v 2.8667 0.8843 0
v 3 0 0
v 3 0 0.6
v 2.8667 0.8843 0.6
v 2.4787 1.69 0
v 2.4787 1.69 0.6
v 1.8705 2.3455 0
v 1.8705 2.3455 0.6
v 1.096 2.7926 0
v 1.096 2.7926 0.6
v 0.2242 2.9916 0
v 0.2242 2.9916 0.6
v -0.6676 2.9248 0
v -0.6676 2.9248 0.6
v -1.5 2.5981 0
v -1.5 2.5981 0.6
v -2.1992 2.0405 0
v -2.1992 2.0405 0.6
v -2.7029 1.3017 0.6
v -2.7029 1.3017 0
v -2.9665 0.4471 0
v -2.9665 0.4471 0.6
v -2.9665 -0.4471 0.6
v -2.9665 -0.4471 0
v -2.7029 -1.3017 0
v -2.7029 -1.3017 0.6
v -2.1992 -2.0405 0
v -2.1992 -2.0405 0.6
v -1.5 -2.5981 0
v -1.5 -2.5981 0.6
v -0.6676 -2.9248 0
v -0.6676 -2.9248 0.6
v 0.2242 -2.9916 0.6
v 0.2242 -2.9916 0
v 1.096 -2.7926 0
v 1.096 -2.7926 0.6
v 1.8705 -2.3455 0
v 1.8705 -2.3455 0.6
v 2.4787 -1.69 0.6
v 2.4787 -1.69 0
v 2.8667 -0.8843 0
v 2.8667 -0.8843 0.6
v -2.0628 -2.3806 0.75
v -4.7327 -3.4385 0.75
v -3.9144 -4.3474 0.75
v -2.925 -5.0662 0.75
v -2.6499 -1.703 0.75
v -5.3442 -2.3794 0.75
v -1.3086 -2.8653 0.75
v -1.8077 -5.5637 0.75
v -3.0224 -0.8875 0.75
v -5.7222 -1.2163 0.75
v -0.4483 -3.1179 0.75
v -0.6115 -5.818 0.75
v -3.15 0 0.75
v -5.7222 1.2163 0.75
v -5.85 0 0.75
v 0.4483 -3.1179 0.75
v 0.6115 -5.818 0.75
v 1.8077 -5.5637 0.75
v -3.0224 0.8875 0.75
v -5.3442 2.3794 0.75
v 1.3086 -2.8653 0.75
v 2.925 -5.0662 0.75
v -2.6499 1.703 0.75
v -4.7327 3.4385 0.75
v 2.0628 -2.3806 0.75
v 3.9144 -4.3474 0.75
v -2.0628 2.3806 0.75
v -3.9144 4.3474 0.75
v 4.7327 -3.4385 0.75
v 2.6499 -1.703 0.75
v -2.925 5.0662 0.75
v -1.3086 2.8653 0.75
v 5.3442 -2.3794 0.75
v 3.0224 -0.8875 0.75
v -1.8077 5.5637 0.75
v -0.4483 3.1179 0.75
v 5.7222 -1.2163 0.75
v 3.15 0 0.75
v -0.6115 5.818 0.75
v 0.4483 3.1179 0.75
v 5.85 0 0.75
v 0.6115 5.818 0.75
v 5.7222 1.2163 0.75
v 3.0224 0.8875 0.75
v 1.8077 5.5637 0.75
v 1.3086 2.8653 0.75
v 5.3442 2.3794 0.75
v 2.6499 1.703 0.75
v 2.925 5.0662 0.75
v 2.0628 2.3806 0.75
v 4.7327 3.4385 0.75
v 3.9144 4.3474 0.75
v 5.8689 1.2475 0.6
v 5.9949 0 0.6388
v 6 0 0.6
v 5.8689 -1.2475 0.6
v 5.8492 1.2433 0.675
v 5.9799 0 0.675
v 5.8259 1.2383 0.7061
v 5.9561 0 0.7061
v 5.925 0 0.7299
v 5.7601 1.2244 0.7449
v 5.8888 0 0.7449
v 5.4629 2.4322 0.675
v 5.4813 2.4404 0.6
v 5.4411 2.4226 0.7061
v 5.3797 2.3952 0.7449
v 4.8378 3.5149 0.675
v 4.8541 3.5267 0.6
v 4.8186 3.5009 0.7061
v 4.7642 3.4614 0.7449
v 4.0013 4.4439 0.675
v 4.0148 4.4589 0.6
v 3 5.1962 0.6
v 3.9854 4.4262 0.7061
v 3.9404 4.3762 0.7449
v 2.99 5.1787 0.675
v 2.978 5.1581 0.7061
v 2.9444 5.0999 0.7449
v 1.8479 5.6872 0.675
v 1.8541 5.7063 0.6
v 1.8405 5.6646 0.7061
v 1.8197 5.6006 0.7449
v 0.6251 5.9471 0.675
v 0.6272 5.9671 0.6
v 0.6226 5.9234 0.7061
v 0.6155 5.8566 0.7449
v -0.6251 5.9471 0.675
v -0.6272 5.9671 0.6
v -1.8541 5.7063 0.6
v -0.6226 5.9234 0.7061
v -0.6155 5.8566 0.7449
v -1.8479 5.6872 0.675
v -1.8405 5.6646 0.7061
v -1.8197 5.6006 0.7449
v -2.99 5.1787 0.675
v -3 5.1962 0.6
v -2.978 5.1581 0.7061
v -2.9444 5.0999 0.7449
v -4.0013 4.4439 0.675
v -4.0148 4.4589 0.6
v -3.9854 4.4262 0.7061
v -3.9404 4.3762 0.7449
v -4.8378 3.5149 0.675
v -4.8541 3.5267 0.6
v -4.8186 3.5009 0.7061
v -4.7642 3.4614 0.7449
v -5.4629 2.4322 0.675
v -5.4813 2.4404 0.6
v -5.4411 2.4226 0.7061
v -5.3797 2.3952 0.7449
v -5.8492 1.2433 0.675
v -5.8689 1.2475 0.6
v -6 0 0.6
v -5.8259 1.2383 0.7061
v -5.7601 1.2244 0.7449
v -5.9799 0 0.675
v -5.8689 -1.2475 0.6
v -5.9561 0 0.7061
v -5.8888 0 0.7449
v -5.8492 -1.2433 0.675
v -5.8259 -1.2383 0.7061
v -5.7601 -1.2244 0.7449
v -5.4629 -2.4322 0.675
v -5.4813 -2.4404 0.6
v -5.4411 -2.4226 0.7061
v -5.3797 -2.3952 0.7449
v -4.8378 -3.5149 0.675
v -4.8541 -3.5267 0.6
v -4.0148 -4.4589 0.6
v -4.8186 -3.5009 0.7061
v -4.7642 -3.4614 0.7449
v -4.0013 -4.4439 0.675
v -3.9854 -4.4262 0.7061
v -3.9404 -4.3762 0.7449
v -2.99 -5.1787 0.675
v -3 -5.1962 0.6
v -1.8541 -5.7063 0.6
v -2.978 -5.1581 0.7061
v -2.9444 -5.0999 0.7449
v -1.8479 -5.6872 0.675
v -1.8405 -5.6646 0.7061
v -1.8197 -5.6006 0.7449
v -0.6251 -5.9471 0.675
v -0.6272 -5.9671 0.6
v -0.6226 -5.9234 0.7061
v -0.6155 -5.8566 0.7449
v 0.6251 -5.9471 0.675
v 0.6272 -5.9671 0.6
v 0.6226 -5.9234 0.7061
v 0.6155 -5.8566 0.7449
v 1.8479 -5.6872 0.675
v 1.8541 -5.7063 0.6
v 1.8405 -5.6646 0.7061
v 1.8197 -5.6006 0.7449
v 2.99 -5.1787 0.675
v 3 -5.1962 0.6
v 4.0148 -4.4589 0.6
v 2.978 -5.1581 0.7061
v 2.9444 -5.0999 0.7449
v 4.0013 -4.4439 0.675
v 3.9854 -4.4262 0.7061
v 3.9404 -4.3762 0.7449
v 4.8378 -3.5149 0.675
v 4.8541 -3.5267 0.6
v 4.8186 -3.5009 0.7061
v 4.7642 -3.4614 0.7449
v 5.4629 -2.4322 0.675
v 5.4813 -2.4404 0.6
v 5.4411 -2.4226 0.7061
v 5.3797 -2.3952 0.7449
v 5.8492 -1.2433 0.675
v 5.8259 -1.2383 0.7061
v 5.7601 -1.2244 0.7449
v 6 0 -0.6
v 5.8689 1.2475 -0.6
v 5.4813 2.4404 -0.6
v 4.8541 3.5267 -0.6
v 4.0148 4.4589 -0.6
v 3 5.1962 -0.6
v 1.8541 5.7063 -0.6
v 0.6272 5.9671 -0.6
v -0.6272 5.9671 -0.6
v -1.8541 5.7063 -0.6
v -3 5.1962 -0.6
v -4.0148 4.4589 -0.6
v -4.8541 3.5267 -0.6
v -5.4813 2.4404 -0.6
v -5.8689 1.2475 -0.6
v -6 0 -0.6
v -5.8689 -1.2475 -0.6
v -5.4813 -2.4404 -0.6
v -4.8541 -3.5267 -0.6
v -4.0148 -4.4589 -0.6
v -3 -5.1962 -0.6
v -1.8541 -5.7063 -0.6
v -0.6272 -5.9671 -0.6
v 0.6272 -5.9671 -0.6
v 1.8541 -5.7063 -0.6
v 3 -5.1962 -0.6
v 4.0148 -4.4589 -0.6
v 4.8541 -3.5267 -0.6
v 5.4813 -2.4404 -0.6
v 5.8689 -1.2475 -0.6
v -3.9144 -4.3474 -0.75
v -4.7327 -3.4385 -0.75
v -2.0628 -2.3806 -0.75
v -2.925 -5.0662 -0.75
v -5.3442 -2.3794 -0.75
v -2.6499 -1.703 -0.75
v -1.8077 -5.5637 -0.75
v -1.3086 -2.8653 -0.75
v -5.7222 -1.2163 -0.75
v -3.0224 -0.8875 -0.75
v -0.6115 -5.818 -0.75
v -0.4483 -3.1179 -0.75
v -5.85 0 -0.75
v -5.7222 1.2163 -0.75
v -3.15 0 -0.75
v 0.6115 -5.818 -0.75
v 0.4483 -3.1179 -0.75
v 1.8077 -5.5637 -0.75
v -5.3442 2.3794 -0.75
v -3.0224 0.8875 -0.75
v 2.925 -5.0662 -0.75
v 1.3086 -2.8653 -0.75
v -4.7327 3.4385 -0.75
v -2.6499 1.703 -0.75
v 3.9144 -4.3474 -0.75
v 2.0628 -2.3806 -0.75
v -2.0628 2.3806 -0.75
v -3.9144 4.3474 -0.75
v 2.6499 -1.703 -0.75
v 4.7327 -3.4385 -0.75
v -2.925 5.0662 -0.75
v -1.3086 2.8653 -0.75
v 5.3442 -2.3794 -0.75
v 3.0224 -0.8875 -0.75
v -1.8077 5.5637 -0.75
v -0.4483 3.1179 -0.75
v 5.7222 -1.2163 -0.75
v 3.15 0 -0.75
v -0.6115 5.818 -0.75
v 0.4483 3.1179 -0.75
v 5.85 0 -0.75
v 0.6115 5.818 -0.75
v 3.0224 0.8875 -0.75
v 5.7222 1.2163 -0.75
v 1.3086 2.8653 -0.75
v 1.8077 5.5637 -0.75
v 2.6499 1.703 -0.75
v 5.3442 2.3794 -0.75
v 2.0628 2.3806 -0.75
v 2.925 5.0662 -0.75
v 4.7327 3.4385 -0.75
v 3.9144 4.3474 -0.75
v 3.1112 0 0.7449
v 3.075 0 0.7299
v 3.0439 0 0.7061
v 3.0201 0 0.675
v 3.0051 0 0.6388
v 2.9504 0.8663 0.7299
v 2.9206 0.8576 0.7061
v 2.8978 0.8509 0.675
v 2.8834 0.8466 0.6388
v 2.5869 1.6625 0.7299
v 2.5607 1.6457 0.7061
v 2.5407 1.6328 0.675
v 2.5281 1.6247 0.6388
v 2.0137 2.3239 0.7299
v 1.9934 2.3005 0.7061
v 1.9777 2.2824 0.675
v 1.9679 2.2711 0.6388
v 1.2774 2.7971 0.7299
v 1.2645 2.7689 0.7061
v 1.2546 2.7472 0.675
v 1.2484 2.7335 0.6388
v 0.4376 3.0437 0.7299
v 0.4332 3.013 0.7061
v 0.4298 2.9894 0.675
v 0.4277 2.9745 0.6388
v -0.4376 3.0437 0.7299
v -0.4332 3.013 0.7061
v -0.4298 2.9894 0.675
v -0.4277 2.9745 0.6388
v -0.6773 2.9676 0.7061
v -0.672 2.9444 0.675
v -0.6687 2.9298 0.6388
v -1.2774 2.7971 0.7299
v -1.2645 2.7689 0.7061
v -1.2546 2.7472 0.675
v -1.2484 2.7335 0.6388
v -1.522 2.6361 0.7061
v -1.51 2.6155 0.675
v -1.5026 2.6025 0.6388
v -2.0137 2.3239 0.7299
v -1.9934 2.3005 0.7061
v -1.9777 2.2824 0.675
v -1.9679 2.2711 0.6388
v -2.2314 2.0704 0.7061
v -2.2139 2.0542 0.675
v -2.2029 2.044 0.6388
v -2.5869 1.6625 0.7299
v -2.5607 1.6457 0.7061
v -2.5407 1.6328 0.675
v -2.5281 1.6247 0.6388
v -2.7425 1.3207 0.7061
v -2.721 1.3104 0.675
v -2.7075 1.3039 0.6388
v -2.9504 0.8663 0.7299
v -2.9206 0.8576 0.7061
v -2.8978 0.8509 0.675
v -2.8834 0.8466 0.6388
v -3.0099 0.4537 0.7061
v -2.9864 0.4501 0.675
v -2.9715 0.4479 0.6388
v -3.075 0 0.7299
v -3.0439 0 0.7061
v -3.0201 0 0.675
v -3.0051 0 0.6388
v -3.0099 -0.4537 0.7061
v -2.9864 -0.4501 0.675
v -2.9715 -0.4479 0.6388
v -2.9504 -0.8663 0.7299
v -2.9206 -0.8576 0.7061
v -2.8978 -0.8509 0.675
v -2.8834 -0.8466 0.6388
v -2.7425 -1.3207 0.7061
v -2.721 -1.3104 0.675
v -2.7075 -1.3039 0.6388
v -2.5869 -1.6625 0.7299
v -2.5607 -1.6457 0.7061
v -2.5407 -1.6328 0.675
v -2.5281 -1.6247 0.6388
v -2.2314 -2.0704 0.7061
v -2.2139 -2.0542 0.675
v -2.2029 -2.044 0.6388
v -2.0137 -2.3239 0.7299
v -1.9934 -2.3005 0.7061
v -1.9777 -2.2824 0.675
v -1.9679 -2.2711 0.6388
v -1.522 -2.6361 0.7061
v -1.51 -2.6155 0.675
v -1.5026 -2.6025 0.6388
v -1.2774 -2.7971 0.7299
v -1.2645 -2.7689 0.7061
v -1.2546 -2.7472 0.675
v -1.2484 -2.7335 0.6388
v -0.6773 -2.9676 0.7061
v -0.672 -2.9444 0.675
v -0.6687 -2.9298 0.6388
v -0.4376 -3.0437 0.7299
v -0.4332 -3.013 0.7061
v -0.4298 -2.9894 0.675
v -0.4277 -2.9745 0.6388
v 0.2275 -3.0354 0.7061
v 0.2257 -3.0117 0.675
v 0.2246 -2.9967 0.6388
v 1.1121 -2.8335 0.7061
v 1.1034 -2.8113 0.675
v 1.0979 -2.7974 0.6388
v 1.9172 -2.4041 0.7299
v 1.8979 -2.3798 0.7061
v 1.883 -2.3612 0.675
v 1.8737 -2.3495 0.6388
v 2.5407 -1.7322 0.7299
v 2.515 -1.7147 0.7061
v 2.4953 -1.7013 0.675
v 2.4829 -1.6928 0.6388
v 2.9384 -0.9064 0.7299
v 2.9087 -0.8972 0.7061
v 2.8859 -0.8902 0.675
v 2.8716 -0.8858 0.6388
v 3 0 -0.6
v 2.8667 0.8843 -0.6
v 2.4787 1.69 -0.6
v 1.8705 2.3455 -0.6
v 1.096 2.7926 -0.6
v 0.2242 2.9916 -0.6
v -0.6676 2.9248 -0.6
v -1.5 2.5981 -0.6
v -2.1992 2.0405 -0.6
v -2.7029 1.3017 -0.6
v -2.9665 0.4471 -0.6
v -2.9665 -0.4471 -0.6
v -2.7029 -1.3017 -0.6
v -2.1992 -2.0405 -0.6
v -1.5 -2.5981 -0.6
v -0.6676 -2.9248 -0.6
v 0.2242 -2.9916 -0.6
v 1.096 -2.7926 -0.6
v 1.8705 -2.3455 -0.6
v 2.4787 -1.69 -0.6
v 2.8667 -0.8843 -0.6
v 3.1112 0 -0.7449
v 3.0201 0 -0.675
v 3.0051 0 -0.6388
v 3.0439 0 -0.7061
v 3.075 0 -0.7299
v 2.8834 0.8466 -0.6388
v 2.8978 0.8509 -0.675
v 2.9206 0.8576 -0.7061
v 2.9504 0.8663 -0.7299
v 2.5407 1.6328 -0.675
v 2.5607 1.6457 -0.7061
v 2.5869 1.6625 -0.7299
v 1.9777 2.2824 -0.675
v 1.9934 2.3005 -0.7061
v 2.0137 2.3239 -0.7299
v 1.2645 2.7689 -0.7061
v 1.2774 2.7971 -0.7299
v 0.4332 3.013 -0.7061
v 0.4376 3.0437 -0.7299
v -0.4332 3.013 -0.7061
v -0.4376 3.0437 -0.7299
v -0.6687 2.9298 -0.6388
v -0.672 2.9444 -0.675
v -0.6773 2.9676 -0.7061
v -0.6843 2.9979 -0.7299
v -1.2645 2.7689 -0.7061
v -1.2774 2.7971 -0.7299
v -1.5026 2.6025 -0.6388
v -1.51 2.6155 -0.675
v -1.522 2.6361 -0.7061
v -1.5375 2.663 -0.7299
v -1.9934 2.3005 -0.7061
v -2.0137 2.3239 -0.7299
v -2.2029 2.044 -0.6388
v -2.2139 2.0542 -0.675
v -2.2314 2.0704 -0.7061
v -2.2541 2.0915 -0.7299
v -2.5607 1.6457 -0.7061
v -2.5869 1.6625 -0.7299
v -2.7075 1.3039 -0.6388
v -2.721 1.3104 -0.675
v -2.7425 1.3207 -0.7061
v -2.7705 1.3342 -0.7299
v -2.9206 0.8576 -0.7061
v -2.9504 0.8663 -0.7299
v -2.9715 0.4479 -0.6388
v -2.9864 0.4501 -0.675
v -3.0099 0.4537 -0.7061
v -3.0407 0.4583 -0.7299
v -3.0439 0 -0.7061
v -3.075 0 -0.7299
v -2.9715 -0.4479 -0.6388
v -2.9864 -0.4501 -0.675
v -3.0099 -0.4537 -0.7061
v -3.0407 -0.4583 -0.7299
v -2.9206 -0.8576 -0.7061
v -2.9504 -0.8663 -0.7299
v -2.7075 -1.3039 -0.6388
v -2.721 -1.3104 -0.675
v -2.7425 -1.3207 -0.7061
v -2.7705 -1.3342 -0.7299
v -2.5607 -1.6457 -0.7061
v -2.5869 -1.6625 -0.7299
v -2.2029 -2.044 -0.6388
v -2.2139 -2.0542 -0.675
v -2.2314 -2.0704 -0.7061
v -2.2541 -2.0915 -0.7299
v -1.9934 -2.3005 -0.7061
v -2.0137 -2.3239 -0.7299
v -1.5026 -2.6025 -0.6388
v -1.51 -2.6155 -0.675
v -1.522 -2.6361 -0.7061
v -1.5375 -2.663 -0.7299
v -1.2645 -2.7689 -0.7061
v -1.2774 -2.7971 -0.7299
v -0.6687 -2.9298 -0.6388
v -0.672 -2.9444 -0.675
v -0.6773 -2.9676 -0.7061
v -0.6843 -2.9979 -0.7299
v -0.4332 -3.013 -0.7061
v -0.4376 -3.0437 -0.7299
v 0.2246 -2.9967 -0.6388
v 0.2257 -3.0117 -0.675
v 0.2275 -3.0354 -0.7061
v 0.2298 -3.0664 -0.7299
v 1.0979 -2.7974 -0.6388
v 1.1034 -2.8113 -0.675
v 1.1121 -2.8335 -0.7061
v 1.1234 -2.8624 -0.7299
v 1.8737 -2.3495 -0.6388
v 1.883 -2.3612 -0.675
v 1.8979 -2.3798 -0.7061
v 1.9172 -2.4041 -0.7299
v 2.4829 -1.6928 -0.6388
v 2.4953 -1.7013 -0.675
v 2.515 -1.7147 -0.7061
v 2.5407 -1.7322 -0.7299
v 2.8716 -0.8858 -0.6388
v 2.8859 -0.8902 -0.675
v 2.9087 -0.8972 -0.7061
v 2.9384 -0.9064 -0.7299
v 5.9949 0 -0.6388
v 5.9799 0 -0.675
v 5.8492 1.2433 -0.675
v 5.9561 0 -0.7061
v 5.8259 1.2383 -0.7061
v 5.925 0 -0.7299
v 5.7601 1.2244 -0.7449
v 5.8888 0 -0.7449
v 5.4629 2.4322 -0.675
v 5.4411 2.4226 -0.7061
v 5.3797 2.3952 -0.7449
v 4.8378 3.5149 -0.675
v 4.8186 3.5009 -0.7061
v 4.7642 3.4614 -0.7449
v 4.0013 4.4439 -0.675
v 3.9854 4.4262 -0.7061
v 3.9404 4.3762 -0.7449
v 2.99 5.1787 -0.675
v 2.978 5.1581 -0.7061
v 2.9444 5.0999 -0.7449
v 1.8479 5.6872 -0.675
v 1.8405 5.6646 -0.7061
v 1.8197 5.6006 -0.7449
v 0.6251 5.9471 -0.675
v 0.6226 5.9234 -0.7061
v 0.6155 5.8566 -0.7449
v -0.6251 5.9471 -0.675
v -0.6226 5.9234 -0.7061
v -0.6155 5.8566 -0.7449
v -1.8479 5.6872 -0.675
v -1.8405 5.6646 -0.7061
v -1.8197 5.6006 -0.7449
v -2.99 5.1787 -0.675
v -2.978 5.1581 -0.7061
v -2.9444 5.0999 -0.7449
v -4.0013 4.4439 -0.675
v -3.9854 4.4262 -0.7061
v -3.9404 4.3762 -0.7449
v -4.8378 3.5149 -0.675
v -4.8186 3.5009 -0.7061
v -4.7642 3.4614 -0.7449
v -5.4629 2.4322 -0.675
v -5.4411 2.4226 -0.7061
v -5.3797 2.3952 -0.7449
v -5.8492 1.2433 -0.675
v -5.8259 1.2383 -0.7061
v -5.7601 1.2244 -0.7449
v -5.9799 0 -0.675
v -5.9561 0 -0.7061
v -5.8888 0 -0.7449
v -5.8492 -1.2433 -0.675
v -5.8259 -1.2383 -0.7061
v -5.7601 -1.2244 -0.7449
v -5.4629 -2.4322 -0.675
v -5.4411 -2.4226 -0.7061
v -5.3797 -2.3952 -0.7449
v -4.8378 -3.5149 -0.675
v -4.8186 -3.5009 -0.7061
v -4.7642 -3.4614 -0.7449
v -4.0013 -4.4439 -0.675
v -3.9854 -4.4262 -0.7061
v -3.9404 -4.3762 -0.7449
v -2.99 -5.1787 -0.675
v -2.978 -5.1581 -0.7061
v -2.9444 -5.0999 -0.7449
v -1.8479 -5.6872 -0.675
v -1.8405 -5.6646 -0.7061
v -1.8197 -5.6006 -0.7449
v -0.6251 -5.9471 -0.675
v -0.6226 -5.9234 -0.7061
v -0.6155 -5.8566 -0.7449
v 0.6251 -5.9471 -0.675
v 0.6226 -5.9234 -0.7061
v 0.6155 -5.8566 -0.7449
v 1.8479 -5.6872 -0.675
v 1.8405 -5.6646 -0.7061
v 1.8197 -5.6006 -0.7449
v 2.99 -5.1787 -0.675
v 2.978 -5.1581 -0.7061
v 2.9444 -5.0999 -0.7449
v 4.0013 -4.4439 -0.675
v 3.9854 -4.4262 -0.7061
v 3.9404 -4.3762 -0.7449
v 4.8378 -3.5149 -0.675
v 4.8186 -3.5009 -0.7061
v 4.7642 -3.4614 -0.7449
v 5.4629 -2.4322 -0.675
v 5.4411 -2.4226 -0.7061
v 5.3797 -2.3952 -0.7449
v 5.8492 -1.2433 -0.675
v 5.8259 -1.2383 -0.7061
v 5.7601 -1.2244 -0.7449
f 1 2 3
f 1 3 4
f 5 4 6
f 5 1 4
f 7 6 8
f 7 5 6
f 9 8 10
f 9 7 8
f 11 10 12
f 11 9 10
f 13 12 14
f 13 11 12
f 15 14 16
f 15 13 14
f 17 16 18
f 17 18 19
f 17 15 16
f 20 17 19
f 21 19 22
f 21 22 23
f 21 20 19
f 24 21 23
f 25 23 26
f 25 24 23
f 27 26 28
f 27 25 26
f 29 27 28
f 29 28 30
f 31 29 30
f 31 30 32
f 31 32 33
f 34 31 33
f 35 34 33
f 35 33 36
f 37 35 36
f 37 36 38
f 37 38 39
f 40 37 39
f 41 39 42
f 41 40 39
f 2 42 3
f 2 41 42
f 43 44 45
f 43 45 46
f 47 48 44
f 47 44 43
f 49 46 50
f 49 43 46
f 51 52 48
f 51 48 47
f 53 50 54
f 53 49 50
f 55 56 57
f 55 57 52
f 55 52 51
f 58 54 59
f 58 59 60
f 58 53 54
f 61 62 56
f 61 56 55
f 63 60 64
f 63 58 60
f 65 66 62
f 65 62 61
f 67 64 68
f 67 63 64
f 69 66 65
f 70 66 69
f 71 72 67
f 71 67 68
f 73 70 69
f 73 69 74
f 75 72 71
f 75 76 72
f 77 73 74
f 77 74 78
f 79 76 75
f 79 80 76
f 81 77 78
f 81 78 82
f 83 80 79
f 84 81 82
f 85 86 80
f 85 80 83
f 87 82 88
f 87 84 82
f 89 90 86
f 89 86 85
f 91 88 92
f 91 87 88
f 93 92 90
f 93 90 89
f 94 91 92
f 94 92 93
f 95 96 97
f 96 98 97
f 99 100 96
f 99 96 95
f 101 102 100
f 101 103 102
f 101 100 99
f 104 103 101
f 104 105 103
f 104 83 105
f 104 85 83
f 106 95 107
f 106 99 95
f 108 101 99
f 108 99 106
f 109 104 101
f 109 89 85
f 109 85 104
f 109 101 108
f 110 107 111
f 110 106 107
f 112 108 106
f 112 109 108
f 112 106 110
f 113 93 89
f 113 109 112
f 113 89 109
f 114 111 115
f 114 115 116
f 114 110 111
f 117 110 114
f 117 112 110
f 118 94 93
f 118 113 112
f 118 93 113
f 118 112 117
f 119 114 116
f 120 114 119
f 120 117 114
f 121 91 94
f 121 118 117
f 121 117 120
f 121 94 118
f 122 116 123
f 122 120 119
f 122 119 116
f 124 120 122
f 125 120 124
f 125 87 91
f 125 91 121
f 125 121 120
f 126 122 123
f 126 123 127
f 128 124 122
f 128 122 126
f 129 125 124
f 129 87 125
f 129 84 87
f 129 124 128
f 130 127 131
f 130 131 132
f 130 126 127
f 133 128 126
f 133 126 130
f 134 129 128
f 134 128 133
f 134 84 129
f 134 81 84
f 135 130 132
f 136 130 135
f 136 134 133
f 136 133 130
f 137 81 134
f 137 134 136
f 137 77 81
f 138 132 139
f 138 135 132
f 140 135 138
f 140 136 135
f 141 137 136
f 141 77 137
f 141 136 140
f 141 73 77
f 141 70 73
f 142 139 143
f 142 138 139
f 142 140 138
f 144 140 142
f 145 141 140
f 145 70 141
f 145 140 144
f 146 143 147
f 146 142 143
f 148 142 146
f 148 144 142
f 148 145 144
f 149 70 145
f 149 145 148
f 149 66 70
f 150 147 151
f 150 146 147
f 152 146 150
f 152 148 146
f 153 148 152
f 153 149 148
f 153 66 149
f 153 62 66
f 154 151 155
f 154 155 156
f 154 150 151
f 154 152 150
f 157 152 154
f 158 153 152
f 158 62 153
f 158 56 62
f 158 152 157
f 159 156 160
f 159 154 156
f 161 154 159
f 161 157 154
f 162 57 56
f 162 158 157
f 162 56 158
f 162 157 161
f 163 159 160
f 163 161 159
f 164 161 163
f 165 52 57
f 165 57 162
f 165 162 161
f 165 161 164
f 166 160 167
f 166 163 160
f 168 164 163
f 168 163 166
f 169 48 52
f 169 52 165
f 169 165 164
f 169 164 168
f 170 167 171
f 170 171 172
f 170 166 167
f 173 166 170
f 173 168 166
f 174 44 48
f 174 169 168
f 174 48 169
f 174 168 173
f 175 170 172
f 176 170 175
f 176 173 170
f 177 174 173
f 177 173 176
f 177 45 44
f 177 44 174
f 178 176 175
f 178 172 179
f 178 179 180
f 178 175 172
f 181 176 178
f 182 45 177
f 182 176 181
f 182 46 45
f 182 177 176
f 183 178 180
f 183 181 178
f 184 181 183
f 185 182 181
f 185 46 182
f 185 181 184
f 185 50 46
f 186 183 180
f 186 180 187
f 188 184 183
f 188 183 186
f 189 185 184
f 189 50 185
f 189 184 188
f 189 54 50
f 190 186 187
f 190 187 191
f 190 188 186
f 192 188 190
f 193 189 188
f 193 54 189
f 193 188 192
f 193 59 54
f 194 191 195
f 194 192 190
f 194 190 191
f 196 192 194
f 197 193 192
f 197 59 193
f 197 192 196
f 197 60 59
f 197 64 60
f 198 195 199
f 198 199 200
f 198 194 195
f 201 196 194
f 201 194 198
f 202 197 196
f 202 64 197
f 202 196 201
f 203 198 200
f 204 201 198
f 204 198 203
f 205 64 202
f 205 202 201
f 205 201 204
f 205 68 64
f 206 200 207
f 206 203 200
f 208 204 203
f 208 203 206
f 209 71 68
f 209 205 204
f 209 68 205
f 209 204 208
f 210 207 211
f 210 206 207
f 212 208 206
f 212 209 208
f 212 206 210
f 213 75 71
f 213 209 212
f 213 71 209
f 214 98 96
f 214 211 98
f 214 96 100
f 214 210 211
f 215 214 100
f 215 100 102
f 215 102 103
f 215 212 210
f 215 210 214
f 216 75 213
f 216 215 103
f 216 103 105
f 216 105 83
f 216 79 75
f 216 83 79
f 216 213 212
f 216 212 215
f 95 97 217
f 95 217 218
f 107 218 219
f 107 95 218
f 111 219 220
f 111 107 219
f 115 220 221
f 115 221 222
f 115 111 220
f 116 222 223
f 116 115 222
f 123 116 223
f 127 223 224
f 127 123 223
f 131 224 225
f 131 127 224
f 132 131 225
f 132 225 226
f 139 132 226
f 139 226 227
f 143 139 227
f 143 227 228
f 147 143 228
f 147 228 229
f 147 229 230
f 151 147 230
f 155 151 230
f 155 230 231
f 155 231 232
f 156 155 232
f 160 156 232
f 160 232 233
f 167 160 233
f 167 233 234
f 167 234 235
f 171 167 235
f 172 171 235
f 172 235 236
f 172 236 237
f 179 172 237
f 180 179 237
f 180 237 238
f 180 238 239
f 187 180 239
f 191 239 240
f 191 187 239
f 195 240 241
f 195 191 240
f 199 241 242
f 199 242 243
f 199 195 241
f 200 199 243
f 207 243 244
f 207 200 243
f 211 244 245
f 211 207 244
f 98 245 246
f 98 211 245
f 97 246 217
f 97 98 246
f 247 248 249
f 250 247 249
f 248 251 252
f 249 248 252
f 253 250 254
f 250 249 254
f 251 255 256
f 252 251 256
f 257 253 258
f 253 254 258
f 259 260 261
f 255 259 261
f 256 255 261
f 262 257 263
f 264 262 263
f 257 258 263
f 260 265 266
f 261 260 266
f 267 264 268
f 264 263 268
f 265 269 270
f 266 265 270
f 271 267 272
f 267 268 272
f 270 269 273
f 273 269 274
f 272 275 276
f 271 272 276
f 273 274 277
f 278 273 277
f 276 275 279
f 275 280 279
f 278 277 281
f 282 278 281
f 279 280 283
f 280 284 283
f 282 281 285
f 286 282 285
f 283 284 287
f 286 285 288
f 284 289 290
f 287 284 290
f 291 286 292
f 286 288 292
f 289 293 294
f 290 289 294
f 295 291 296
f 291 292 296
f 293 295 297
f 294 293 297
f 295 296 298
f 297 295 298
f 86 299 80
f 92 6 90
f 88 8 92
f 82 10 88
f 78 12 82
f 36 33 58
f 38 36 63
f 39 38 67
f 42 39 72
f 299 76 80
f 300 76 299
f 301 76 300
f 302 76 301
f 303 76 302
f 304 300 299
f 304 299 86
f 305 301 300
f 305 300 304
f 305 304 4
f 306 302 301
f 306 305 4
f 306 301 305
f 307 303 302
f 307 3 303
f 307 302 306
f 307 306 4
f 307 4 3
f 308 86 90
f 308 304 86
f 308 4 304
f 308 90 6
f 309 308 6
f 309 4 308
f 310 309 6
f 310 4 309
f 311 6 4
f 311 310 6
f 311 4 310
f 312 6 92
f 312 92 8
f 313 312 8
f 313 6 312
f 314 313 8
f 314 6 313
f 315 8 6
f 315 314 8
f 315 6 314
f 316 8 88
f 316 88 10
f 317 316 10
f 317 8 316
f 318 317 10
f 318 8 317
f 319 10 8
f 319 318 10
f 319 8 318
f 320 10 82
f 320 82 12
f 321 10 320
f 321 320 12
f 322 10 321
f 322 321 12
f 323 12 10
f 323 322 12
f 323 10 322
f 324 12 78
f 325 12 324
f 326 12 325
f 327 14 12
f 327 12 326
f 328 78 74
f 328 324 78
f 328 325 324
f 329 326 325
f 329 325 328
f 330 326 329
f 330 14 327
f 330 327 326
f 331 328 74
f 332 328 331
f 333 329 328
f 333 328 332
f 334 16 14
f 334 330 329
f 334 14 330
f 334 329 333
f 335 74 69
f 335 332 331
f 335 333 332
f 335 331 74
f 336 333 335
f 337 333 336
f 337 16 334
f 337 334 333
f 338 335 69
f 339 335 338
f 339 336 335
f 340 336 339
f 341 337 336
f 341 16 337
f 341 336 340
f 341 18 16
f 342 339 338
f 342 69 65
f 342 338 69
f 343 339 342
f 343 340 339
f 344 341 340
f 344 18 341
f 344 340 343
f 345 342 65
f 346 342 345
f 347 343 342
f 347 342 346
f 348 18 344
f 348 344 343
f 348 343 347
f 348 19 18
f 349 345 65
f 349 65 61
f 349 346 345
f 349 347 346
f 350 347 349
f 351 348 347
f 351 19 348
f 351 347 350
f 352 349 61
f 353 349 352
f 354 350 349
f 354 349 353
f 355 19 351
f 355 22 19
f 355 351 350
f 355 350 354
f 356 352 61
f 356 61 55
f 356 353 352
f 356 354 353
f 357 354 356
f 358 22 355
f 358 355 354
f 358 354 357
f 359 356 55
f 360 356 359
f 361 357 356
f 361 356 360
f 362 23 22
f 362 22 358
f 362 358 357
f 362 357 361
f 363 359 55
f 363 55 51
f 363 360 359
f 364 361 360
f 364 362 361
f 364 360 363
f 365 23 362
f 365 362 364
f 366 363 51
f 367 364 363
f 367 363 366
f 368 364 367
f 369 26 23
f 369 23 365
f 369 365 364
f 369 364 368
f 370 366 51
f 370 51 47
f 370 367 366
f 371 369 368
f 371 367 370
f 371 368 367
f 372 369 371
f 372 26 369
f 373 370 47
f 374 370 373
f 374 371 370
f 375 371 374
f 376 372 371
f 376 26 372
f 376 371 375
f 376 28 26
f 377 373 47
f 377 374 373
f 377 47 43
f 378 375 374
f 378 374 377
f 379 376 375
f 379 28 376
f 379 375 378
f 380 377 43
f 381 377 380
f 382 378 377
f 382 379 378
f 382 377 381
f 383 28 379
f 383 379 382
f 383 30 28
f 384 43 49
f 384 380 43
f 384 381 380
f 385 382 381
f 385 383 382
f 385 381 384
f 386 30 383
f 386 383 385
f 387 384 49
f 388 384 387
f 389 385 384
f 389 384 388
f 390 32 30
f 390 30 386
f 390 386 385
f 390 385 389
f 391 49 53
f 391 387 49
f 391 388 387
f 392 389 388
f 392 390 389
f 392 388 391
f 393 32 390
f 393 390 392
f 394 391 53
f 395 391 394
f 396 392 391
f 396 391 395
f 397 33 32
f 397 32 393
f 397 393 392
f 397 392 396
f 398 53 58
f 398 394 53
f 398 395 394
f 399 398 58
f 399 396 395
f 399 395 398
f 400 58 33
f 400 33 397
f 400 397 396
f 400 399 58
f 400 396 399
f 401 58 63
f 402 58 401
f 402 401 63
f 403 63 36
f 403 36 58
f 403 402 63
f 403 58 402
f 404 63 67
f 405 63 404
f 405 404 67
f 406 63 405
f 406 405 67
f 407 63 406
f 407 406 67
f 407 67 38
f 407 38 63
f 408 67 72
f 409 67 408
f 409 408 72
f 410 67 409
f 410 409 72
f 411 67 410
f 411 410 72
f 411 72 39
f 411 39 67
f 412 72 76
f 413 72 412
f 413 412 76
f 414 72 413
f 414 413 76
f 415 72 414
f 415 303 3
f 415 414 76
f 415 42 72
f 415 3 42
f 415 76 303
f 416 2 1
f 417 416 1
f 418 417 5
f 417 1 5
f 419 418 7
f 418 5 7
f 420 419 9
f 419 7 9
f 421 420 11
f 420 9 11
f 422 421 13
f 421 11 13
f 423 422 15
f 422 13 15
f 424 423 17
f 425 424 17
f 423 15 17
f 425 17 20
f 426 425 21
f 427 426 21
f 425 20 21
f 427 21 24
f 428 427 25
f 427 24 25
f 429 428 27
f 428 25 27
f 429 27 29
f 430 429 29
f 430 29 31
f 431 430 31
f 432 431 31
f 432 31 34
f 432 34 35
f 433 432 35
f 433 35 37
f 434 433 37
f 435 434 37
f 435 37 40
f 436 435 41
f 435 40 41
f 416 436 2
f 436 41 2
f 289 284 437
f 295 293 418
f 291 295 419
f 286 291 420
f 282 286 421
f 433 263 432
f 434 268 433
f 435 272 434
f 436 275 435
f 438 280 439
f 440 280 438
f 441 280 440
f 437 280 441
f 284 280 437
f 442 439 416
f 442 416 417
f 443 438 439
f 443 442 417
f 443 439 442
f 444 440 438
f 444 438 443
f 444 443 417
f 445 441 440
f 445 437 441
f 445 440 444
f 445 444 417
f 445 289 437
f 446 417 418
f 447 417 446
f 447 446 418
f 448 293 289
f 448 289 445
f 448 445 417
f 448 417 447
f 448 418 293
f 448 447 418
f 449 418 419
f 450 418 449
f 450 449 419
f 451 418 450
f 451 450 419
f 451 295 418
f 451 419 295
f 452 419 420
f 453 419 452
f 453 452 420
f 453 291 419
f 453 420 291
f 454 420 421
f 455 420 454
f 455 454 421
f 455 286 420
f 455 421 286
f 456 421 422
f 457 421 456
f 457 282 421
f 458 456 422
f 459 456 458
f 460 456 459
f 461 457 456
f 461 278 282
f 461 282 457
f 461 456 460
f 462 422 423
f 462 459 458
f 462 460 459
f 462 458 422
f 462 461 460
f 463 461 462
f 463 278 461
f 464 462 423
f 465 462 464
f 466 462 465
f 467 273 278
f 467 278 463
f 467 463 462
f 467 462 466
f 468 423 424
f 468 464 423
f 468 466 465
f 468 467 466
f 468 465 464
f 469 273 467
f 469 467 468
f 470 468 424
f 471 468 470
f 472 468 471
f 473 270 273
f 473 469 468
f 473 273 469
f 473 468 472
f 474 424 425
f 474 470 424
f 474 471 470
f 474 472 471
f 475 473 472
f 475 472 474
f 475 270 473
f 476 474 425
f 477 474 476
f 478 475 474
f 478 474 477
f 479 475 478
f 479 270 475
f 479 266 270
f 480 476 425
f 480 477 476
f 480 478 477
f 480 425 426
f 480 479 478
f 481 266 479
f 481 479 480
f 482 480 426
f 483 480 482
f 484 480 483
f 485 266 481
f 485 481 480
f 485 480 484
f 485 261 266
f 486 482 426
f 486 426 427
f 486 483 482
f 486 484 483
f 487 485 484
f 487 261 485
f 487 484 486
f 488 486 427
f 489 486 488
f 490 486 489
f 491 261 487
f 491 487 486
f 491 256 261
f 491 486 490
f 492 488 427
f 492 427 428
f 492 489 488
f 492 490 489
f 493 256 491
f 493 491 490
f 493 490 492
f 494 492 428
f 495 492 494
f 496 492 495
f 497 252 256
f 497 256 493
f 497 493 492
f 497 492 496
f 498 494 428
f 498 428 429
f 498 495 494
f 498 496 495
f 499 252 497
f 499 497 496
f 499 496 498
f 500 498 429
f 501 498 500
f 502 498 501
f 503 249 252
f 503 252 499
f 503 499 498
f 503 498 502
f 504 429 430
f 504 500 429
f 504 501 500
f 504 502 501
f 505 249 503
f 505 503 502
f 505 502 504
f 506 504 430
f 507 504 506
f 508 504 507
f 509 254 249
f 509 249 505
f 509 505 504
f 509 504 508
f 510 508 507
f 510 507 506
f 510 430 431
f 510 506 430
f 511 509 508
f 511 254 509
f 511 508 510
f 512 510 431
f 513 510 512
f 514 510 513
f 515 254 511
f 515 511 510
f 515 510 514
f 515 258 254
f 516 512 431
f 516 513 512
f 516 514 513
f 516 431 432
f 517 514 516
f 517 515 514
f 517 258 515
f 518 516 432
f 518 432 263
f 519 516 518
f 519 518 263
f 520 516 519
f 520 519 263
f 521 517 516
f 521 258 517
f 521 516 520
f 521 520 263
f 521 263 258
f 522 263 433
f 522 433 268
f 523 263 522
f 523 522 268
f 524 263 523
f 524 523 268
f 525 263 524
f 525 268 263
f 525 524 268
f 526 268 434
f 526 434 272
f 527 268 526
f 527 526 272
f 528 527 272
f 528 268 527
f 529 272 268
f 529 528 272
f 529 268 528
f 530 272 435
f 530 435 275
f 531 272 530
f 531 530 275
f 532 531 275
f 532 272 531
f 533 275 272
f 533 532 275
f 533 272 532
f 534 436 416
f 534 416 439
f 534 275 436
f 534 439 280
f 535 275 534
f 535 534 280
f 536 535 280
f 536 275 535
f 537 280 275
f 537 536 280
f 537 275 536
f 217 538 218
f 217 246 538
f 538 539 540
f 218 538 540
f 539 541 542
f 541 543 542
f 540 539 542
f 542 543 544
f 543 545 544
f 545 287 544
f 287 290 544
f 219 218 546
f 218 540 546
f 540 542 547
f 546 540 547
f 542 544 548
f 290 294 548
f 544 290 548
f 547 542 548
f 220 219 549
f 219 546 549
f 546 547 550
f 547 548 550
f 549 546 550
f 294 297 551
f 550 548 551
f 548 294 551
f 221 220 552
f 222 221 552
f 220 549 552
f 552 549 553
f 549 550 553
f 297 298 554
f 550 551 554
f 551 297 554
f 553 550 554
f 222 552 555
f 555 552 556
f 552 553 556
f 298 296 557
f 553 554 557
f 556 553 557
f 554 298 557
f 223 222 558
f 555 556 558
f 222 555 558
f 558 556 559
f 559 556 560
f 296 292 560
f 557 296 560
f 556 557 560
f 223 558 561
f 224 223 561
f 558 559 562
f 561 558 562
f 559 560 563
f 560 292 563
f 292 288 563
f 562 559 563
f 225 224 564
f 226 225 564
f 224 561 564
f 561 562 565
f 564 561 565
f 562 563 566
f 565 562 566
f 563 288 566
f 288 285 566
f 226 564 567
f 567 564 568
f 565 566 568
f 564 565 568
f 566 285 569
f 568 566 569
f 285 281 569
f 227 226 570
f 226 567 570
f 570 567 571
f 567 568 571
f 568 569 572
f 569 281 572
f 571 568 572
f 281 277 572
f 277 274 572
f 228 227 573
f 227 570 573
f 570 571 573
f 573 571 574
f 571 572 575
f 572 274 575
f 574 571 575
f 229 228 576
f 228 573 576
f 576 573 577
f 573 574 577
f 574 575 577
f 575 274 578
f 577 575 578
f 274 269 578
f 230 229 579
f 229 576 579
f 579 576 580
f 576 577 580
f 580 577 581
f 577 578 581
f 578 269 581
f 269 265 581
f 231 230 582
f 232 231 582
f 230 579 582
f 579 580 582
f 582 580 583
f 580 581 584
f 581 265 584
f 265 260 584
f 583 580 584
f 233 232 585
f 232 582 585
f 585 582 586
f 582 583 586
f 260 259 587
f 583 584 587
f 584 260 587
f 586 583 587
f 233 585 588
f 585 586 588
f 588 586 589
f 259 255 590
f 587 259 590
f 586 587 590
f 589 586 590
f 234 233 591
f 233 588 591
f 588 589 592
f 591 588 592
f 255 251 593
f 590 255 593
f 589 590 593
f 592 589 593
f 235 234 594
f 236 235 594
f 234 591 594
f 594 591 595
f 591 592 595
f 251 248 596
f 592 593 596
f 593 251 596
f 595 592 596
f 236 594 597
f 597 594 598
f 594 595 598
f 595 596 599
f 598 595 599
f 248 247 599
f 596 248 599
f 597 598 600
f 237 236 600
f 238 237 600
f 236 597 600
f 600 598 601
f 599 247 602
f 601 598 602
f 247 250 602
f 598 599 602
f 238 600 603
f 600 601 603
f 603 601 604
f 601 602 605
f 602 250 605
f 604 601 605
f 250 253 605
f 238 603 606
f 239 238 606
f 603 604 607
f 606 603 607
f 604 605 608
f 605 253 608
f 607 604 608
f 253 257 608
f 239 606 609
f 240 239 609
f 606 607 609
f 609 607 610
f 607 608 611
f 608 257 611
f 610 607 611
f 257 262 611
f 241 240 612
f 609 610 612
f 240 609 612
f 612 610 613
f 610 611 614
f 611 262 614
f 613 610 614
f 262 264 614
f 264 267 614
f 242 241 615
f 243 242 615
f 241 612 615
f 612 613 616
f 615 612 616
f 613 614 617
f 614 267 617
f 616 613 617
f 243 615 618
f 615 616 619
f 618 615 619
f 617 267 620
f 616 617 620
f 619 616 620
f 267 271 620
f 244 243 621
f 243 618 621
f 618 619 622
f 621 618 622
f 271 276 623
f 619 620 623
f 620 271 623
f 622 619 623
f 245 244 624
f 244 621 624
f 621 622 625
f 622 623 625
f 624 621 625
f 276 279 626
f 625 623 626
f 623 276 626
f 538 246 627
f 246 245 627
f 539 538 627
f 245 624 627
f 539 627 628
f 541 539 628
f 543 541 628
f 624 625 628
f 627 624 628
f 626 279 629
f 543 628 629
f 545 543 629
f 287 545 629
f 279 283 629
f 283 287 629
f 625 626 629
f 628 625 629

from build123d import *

# Parameters (mm, degrees)
SKETCH3_R                = 6
SKETCH3_R_2              = 3
BOSS_EXTRUDE1_DEPTH      = 0.75
BOSS_EXTRUDE1_DEPTH_BACK = 0.75
FILLET1_R                = 0.15


with BuildPart() as part:
    # Sketch3 → Boss-Extrude1 (new body, two sides)
    with BuildSketch(Plane.XY) as boss_extrude1_sk:
        Circle(SKETCH3_R)
        Circle(SKETCH3_R_2, mode=Mode.SUBTRACT)
    extrude(amount=BOSS_EXTRUDE1_DEPTH)
    extrude(boss_extrude1_sk.sketch, amount=-BOSS_EXTRUDE1_DEPTH_BACK)

    # Fillet1
    fillet1_edges = [part.edges().sort_by_distance(p)[0] for p in [
        (-6, 0, 0.75),
        (-3, 0, 0.75),
        (-6, 0, -0.75),
        (-3, 0, -0.75),
    ]]
    fillet(fillet1_edges, radius=FILLET1_R)


solid = part.part
